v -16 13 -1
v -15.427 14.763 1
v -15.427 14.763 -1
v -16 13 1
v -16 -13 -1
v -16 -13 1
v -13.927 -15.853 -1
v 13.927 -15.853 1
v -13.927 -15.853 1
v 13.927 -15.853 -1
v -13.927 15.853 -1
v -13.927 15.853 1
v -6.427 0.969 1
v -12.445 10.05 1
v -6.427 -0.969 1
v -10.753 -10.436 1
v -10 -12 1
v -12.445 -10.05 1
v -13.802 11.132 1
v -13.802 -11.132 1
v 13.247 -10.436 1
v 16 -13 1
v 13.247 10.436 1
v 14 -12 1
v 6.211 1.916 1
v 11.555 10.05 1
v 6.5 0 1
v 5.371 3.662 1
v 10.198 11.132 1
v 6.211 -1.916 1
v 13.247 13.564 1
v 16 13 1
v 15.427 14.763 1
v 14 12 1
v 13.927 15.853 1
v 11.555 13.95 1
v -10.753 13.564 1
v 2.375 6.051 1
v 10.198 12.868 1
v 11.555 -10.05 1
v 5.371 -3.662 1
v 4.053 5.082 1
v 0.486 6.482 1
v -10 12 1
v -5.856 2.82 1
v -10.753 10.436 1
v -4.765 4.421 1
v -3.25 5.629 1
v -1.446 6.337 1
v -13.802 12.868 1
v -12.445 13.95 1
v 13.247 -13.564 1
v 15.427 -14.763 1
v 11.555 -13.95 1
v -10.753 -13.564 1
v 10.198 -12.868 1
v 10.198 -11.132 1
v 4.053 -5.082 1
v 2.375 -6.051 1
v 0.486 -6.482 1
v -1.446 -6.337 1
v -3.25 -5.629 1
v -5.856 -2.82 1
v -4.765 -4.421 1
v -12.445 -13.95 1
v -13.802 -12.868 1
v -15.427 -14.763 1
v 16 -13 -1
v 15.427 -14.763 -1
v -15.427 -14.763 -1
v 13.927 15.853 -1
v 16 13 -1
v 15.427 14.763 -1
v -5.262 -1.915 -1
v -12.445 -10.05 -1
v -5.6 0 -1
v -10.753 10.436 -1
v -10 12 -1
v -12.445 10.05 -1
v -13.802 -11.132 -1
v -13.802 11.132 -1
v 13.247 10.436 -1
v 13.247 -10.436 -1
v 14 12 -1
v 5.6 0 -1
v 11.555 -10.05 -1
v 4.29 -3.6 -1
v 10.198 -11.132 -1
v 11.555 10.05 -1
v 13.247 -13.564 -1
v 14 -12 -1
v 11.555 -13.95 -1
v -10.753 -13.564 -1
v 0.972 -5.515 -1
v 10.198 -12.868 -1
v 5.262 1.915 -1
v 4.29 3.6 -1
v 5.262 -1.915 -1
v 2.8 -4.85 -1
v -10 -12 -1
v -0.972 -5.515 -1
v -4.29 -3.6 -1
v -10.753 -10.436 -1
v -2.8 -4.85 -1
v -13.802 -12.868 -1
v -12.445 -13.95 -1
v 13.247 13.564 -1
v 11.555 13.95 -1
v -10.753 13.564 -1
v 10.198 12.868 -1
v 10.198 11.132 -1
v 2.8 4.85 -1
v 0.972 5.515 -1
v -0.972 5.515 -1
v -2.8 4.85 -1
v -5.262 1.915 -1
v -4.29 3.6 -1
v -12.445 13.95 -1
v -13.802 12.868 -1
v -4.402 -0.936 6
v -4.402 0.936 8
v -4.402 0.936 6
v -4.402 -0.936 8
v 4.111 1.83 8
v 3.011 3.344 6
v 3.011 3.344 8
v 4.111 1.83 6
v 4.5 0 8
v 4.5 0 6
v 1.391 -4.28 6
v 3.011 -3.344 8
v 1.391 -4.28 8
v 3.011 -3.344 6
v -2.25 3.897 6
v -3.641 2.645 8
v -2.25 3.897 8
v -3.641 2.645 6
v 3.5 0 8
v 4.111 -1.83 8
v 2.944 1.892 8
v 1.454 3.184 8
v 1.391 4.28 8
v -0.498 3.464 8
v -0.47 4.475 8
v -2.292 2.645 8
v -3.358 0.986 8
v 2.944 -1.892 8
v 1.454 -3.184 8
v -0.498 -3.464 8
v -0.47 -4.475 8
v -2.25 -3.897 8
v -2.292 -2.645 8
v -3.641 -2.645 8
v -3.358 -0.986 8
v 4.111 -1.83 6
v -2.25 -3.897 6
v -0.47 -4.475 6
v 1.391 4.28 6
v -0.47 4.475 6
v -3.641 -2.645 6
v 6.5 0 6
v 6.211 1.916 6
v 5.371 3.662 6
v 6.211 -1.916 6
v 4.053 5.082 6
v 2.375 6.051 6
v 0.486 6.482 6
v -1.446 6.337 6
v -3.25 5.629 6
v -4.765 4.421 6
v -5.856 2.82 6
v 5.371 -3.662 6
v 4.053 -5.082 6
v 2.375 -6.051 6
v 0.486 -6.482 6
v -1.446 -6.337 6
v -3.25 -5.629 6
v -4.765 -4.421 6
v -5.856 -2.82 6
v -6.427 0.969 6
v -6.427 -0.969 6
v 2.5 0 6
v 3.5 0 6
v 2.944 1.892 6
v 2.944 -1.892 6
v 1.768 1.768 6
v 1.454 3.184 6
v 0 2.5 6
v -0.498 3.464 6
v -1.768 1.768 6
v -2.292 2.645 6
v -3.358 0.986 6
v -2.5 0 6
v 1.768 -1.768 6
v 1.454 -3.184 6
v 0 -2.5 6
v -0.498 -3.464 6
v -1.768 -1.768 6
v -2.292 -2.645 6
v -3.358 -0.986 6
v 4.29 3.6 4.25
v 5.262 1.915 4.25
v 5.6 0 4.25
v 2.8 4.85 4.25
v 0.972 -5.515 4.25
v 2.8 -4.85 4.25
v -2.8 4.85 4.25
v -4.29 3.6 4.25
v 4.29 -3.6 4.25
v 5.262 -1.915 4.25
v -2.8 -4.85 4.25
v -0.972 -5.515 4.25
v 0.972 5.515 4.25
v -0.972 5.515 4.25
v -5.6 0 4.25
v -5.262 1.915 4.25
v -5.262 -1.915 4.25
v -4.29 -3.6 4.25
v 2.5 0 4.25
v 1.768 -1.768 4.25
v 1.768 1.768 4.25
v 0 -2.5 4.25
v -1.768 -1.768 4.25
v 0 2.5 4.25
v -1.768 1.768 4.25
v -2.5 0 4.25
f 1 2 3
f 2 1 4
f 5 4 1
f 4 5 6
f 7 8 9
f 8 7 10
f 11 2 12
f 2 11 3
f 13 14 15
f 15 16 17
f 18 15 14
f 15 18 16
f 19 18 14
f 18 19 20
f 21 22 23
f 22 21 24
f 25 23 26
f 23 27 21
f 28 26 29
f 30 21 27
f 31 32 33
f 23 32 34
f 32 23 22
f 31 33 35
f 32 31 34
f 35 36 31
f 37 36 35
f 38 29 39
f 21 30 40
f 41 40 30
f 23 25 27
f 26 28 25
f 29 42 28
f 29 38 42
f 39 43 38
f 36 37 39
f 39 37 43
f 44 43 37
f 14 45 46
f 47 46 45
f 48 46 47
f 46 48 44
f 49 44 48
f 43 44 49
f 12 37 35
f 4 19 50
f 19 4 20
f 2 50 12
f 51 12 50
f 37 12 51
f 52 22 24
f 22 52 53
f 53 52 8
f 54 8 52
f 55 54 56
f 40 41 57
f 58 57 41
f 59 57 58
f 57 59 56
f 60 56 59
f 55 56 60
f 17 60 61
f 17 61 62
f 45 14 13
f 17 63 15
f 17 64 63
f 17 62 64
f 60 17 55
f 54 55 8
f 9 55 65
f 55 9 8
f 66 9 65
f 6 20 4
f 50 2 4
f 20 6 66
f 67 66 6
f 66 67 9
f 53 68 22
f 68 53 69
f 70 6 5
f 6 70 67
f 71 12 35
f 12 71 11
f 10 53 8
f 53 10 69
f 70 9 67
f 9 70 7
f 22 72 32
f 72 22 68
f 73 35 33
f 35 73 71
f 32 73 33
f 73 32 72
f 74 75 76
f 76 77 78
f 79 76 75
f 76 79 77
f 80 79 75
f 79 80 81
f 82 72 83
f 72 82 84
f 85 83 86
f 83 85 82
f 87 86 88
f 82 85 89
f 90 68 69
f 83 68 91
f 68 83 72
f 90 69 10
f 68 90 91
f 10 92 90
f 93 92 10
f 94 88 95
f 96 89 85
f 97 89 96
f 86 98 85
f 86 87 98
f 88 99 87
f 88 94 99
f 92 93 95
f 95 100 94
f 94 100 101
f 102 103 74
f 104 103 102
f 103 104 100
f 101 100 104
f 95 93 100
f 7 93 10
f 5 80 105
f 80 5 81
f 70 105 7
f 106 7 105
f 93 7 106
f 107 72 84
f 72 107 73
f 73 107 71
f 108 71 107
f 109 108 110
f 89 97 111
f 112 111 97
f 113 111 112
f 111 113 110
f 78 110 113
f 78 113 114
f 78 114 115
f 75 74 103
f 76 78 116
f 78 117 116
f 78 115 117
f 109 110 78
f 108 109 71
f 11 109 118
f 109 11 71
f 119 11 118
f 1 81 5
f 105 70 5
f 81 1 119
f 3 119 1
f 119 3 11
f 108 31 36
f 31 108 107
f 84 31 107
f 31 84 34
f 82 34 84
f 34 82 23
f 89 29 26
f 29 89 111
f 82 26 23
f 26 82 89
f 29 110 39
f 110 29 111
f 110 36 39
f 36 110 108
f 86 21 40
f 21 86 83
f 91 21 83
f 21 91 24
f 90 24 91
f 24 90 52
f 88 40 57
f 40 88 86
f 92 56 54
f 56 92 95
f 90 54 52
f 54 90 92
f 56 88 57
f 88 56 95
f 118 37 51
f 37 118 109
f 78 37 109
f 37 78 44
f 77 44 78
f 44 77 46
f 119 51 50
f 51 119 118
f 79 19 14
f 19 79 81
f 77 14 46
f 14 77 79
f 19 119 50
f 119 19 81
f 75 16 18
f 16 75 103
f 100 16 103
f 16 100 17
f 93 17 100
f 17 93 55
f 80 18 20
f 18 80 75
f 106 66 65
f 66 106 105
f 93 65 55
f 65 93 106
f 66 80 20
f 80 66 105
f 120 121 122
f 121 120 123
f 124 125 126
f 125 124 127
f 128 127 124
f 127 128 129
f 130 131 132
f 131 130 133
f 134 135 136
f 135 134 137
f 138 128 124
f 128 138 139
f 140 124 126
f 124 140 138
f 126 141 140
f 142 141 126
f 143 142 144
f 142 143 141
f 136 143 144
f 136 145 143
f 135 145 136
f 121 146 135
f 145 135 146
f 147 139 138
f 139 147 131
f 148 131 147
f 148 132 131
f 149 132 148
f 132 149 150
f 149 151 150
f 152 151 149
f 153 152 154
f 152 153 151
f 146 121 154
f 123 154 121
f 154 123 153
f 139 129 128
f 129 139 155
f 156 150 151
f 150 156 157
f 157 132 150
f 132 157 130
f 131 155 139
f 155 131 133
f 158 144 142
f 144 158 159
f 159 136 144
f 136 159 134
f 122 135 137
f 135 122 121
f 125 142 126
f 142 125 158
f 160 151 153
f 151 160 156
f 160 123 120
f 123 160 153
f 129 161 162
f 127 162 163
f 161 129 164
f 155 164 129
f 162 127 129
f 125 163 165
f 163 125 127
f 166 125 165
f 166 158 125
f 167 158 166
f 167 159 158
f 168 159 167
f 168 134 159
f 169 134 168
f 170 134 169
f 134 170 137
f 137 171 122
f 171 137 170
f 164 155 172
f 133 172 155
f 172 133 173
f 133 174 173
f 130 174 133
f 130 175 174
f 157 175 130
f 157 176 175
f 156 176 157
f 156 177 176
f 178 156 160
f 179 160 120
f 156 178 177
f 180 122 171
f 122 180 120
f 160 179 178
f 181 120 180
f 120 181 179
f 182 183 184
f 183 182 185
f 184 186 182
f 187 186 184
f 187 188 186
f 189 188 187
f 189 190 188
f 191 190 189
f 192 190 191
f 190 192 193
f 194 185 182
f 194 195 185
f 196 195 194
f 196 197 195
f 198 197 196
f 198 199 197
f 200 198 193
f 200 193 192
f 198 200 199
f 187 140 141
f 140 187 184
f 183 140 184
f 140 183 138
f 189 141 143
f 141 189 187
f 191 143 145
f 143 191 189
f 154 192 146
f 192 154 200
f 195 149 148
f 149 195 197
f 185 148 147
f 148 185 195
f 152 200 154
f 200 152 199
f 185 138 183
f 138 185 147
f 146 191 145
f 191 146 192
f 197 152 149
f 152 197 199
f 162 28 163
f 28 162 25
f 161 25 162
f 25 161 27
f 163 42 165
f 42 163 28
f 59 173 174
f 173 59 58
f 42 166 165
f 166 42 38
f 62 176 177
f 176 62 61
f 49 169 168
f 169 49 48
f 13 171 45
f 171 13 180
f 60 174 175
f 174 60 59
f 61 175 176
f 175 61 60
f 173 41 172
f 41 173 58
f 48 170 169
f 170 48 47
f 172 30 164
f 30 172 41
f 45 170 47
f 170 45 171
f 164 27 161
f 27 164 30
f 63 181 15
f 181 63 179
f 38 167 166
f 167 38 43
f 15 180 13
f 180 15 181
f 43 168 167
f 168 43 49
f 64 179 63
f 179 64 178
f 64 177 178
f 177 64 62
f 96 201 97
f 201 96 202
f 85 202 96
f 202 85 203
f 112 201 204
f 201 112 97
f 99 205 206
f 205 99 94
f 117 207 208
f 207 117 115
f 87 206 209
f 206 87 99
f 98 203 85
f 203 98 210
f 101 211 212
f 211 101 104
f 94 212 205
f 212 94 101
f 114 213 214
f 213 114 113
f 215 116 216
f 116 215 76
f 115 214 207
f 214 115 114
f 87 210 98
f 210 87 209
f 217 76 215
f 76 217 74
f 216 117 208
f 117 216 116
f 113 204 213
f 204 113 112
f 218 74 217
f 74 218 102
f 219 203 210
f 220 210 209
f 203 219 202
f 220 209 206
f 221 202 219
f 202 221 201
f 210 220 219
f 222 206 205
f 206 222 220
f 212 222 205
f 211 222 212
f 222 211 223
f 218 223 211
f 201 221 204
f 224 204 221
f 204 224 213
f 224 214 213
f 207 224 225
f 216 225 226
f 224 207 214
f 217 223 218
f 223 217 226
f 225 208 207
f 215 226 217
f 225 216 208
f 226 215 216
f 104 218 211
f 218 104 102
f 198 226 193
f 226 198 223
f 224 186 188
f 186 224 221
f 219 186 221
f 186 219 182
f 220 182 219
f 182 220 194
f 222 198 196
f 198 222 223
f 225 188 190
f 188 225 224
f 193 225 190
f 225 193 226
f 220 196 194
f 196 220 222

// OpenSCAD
/*
 * Written by Dermot Tynan, Kalopa Research.
 * GPLv2.
 *
 * Cap to prevent water ingress into the WDI.
 *
 * All dimensions are in mm.
 */
module base_plate()
{
	difference() {
		minkowski() {
			cube([26, 26, 1], center = true);
			cylinder(r = 3, h = 1, center = true);
		}
		translate([12, 12, 0]) cylinder(r = 4/2, h = 10, center = true);
		translate([12, -12, 0]) cylinder(r = 4/2, h = 10, center = true);
		translate([-12, 12, 0]) cylinder(r = 4/2, h = 10, center = true);
		translate([-12, -12, 0]) cylinder(r = 4/2, h = 10, center = true);
	}
}

module cap_ring()
{
	difference() {
		cylinder(r = 9/2, h = 2, center = true);
		cylinder(r = 7/2, h = 10, center = true);
	}
}

module cap_plate()
{
	difference() {
		union() {
			base_plate();
			translate([0, 0, 3.5]) cylinder(r = 13/2, h = 5, center = true);
			translate([0, 0, 7]) cap_ring();
		}
		cylinder(r = 11.2/2, h = 8.5, center = true);
		cylinder(r = 5/2, h = 20, center = true);
	}
}

cap_plate();
